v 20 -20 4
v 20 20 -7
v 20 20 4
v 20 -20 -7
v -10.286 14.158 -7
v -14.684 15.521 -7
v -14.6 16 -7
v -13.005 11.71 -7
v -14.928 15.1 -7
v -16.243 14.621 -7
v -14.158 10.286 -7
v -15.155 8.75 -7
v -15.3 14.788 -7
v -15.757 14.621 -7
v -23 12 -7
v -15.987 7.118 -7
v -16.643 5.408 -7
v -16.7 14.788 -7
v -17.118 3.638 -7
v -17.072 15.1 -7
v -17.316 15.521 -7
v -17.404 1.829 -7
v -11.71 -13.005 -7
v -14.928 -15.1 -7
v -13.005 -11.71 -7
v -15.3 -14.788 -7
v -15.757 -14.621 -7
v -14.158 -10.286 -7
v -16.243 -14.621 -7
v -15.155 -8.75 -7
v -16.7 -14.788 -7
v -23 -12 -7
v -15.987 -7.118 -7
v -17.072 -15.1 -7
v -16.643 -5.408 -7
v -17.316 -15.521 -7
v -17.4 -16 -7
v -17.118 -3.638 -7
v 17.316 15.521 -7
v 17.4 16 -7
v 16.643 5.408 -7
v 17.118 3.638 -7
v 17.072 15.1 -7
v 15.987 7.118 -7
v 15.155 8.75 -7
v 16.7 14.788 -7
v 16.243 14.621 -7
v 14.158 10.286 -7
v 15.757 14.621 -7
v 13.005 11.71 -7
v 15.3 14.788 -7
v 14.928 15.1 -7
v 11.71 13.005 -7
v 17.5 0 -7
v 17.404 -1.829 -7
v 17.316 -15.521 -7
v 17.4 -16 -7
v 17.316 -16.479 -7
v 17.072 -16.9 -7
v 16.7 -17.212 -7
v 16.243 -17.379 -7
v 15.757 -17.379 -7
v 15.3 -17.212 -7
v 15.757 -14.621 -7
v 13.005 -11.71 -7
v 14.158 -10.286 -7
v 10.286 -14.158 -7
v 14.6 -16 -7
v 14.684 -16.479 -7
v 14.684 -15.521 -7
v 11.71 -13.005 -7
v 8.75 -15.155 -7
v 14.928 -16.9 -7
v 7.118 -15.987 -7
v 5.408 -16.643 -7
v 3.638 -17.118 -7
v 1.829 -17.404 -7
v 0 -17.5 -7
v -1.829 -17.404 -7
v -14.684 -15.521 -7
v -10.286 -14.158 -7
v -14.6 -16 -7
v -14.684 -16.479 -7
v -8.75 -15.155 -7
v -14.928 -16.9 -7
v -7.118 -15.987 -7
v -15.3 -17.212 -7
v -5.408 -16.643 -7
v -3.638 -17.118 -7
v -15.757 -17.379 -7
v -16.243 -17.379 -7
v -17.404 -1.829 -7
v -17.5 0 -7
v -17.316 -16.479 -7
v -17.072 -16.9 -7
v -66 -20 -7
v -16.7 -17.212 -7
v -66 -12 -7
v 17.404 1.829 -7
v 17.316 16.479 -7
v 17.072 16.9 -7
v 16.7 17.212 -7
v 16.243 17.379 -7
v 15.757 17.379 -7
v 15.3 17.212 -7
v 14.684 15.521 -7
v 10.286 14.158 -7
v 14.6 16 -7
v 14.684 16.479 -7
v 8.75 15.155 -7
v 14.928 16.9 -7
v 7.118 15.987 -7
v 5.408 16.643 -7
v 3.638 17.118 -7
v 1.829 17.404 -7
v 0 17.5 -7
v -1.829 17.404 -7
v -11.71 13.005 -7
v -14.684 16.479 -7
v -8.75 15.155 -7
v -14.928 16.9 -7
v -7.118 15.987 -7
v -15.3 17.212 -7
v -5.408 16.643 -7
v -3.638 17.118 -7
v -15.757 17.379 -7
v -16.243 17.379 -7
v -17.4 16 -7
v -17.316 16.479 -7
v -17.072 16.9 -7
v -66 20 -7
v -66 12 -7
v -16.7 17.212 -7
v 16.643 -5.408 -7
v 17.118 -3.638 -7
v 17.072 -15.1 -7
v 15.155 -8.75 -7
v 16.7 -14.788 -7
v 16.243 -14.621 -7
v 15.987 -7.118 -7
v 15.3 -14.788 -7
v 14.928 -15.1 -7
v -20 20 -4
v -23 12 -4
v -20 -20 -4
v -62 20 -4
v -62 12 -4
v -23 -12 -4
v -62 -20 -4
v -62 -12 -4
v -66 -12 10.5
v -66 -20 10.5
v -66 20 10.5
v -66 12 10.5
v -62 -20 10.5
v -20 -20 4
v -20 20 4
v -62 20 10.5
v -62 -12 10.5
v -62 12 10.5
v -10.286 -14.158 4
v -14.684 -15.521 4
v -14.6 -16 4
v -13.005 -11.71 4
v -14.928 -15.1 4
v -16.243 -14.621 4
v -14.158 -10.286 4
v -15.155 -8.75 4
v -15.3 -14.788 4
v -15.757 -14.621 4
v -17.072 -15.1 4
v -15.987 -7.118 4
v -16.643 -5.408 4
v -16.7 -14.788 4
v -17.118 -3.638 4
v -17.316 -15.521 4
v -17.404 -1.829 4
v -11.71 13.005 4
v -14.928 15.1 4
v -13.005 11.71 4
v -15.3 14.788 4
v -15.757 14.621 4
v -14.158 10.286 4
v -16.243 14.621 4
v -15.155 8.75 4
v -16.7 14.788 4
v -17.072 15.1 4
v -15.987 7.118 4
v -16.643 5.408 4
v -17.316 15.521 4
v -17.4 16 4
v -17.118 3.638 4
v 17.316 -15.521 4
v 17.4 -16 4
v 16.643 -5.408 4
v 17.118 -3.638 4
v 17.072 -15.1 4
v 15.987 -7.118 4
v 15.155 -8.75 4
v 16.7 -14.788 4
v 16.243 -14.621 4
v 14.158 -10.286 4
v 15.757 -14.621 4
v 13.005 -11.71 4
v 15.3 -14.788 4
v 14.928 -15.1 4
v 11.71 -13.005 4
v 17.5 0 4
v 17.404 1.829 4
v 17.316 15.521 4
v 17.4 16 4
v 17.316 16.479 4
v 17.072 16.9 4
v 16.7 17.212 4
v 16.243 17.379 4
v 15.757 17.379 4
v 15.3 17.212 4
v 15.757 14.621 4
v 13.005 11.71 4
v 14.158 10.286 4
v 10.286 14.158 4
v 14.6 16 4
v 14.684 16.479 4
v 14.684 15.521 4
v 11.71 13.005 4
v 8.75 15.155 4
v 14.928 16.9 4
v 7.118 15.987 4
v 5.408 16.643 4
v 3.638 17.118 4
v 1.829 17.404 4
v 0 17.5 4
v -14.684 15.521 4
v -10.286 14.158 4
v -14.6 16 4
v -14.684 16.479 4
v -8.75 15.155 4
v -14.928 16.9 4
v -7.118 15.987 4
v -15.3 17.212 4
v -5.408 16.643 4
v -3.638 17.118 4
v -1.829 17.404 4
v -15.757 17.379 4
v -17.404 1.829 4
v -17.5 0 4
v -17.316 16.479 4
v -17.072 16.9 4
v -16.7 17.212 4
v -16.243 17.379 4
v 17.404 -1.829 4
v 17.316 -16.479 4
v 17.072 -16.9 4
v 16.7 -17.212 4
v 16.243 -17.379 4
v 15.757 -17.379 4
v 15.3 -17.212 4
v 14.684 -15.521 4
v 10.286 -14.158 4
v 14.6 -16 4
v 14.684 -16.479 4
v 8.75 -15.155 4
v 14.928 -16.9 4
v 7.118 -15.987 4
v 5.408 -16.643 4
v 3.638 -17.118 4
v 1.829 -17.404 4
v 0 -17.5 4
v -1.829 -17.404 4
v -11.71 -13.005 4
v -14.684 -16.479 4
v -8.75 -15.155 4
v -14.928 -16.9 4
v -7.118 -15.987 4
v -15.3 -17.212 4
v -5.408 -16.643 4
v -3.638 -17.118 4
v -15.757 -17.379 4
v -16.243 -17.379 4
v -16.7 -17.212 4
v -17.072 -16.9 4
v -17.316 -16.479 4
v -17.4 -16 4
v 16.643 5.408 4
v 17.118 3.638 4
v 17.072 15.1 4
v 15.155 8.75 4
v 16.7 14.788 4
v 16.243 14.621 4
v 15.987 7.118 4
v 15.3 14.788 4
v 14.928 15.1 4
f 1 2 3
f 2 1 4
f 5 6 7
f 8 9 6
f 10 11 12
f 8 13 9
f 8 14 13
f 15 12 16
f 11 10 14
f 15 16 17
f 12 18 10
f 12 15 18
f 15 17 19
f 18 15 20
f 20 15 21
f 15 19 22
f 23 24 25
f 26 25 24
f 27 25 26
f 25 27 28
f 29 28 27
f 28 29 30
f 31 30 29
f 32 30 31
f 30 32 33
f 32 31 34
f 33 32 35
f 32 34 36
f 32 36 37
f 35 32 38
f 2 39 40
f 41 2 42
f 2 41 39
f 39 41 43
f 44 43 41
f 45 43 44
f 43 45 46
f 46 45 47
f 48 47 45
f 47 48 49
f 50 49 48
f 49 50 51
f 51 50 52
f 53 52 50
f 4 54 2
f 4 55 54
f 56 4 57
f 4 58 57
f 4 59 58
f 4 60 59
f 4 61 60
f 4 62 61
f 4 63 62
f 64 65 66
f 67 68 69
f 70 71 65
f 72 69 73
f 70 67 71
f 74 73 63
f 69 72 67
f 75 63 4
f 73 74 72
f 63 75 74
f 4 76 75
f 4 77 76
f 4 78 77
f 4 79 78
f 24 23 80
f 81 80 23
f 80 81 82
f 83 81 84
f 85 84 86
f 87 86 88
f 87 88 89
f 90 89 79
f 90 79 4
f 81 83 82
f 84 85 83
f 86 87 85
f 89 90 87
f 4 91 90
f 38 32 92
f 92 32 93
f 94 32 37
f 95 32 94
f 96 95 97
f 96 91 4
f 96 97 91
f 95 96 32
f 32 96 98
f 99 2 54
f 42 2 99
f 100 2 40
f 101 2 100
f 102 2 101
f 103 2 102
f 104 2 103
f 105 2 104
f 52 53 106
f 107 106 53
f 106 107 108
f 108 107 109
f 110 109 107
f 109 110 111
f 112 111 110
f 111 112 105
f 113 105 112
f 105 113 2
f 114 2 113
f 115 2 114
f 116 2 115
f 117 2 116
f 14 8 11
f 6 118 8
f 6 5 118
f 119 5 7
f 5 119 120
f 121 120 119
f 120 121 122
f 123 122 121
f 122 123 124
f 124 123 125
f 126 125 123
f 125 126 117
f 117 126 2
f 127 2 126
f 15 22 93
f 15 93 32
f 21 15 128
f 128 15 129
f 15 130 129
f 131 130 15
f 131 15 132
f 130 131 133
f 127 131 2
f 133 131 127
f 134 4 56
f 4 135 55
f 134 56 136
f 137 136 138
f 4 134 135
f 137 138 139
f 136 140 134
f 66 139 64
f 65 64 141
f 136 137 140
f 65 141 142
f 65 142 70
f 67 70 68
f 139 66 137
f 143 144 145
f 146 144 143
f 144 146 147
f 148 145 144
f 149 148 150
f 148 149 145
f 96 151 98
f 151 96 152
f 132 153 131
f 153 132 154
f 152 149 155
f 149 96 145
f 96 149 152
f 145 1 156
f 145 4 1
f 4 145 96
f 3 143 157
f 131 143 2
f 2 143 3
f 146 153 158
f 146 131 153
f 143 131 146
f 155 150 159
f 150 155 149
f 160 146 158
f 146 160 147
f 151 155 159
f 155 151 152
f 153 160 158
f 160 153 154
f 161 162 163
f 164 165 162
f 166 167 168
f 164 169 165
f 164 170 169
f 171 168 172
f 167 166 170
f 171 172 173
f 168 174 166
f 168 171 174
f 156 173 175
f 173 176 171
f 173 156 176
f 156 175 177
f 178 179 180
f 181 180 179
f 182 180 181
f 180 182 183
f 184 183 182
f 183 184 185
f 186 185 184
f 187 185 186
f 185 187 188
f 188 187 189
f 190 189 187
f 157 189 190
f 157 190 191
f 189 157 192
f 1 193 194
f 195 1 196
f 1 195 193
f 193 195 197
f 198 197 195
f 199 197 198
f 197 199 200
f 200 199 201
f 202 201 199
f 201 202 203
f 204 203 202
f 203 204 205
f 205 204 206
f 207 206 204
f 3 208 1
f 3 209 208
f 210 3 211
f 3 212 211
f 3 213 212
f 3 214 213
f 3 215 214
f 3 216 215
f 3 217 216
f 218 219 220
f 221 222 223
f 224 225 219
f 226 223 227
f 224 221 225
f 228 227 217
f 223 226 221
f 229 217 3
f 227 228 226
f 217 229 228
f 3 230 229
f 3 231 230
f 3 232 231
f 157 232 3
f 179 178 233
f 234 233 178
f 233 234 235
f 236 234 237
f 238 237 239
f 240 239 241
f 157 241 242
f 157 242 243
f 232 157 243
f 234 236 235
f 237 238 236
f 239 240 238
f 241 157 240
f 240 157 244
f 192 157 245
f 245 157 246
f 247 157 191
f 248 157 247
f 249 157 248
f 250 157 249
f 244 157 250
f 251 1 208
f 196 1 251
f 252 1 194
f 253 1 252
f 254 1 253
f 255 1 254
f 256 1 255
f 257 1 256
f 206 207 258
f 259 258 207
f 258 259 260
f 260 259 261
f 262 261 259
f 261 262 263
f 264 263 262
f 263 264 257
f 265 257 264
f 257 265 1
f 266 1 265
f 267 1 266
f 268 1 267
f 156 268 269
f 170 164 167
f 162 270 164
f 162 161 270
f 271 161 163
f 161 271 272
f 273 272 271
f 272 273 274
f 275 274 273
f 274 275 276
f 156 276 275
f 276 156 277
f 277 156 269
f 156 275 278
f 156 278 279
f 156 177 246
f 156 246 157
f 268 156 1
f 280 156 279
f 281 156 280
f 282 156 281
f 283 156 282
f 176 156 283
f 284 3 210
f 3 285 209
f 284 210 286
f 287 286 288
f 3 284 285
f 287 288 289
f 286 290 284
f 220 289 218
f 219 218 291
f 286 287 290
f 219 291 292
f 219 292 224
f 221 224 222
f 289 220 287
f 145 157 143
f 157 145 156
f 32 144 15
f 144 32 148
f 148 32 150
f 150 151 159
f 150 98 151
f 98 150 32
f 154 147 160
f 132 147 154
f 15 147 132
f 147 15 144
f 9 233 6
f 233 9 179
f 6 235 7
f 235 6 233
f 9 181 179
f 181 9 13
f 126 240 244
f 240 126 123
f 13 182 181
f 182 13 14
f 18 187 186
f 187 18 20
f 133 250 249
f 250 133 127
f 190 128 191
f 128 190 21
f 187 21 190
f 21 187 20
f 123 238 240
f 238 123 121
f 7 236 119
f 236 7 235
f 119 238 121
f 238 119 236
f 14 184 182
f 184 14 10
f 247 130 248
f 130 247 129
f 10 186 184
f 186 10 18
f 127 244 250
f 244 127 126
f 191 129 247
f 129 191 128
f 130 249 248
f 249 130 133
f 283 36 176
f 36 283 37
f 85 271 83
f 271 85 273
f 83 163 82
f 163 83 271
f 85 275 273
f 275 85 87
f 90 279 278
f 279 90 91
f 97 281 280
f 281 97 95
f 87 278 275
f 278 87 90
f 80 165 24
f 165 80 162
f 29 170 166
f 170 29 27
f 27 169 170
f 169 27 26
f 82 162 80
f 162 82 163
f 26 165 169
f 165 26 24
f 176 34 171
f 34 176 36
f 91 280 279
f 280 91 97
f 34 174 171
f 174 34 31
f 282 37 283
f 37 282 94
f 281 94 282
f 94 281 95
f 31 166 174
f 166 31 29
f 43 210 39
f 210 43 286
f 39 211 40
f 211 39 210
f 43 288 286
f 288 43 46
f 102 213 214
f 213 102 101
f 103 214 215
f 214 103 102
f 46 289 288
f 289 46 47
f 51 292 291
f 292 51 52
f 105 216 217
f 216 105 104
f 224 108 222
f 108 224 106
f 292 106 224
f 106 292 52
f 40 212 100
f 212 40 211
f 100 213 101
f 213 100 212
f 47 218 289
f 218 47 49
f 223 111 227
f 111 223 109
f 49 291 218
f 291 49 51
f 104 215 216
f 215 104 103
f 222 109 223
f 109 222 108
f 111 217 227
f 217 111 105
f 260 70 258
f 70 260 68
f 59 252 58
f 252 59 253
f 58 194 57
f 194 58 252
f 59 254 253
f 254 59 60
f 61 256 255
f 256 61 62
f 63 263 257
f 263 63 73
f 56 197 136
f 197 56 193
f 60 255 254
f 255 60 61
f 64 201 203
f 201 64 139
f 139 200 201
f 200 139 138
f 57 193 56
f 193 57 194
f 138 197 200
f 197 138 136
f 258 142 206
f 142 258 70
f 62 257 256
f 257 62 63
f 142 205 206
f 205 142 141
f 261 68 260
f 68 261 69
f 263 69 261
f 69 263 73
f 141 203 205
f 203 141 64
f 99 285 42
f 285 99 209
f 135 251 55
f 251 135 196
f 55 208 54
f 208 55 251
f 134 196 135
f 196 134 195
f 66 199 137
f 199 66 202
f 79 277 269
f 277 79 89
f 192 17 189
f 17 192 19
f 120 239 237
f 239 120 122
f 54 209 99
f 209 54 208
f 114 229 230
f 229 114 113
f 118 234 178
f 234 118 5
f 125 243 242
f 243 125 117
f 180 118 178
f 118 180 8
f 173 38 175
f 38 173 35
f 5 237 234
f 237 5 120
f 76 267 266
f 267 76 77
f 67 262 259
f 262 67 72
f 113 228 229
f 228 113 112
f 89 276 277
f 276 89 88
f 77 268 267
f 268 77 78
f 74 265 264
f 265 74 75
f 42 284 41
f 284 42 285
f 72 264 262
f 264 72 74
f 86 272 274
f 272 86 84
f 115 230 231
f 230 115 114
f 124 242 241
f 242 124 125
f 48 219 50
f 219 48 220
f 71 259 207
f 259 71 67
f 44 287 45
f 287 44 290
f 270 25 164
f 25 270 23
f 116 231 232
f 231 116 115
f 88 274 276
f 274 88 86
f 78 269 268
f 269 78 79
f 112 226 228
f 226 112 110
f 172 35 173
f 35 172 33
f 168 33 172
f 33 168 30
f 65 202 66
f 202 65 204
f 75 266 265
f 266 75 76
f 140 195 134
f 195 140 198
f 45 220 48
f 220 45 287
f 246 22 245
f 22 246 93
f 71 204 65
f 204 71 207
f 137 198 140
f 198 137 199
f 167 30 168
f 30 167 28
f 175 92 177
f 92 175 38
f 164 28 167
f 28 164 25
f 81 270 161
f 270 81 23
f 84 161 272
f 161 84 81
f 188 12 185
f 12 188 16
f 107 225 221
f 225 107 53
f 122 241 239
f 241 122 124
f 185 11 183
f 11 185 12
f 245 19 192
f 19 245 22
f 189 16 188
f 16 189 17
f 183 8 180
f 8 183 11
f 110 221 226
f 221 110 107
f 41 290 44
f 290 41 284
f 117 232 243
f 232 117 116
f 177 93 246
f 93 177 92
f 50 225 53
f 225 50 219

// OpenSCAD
// file: rubik_cube.scad
$fa=6;
$fs=0.5;

size = 18.7;
offset = (size-0.1-4)/2;

module center(){
    hull(){
        translate([offset,offset,0]) cylinder(0.2, d=4, center=true);
        translate([offset,-offset,0]) cylinder(0.2, d=4, center=true);
        translate([-offset,offset,0]) cylinder(0.2, d=4, center=true);
        translate([-offset,-offset,0]) cylinder(0.2, d=4, center=true);
    }
}

module edge(){
    hull(){
        translate([offset,offset,0]) cube([4,4,0.2], center=true);
        translate([offset,-offset,0]) cube([4,4,0.2], center=true);
        translate([-offset,offset,0]) cylinder(0.2, d=4, center=true);
        translate([-offset,-offset,0]) cylinder(0.2, d=4, center=true);
    }
}

module corner(){
    hull(){
        translate([offset,offset,0]) cube([4,4,0.2], center=true);
        translate([offset,-offset,0]) cube([4,4,0.2], center=true);
        translate([-offset,offset,0]) cube([4,4,0.2], center=true);
        translate([-offset,-offset,0]) cylinder(0.2, d=4, center=true);
    }
}

module face(){
    center();
    for(i=[0,90,180,270]){
        rotate([0,0,i]) translate([size, 0, 0]) edge();
        rotate([0,0,i]) translate([size, size, 0]) corner();
    }
}

module rubik_cube(){
    color("white") cube(56,center=true);
    translate([0,0,3*size/2]) color("yellow") face();
    translate([0,0,-3*size/2]) color("white") face();
    rotate([90,0,0]){
        translate([0,0,3*size/2]) color("blue") face();
        translate([0,0,-3*size/2]) color("green") face();
    }
    rotate([0,90,0]){
        translate([0,0,3*size/2]) color("red") face();
        translate([0,0,-3*size/2]) color("orange") face();
    }
}
rubik_cube();
// file: stepper.scad
$fa=6;
$fs=0.5;



stepper42();
translate([0,0,23]) rotate([180,0,0]) flange();
module flange(){
    difference(){
        union(){
            cylinder(h=2,d=22);
            cylinder(h=12,d=10);
        }
        cylinder(h=99,d=5,center=true);
        translate([8,0,0]) cylinder(h=99,d=3,center=true);
        translate([-8,0,0]) cylinder(h=99,d=3,center=true);
        translate([0,-8,0]) cylinder(h=99,d=3,center=true);
        translate([0,8,0]) cylinder(h=99,d=3,center=true);
    }
}


module stepper42(){
    union(){
        top();
        translate([0,0,-8]) mid();
        translate([0,0,-8-9.5-23-8]) mirror([0,0,1]) bot();
    }
}


module mid(){
    mid_r = 8;
    offset_xy = 42/2 - mid_r;
    length = 23+8; // 硅钢片高度
    hull(){
        translate([offset_xy, offset_xy, -length]) cylinder(h=length, r=mid_r, $fn=4);
        translate([offset_xy, -offset_xy, -length]) cylinder(h=length, r=mid_r, $fn=4);
        translate([-offset_xy, offset_xy, -length]) cylinder(h=length, r=mid_r, $fn=4);
        translate([-offset_xy, -offset_xy, -length]) cylinder(h=length, r=mid_r, $fn=4);
    }
}
module top(){
    top_r = 4;
    offset_xy = 42/2 - top_r;
    length = 23+2; // 电机轴长度
    union(){
        difference(){
            hull(){
                translate([offset_xy, offset_xy, -8]) cylinder(h=8, r=top_r, $fn=4);
                translate([offset_xy, -offset_xy, -8]) cylinder(h=8, r=top_r, $fn=4);
                translate([-offset_xy, offset_xy, -8]) cylinder(h=8, r=top_r, $fn=4);
                translate([-offset_xy, -offset_xy, -8]) cylinder(h=8, r=top_r, $fn=4);
            }
            translate([31/2, 31/2, 0]) cylinder(h=20,d=2.5,center=true); 
            translate([-31/2, 31/2, 0]) cylinder(h=20,d=2.5,center=true);
            translate([31/2, -31/2, 0]) cylinder(h=20,d=2.5,center=true);
            translate([-31/2, -31/2, 0]) cylinder(h=20,d=2.5,center=true);       
        }
        difference(){
            cylinder(h=2,d=22);
            cylinder(h=20,d=9,center=true);
        }
        difference(){
             cylinder(h=length,d=5);
             translate([-5/2, 4.5/2, 0]) cube([5,5,length]);
        }
    }
}
module bot()
{
    bot_r = 4;
    offset_xy = 42/2 - bot_r;
    union(){
        difference(){
            hull(){
                translate([offset_xy, offset_xy, -9.5]) cylinder(h=9.5, r=bot_r, $fn=4);
                translate([offset_xy, -offset_xy, -9.5]) cylinder(h=9.5, r=bot_r, $fn=4);
                translate([-offset_xy, offset_xy, -9.5]) cylinder(h=9.5, r=bot_r, $fn=4);
                translate([-offset_xy, -offset_xy, -9.5]) cylinder(h=9.5, r=bot_r, $fn=4);
            }
            translate([31/2, 31/2, 0]) cylinder(h=20,d=3.5,center=true); 
            translate([-31/2, 31/2, 0]) cylinder(h=20,d=3.5,center=true);
            translate([31/2, -31/2, 0]) cylinder(h=20,d=3.5,center=true);
            translate([-31/2, -31/2, 0]) cylinder(h=20,d=3.5,center=true);
            translate([31/2, 31/2, -2.5]) cylinder(h=20,d=6); 
            translate([-31/2, 31/2, -2.5]) cylinder(h=20,d=6);
            translate([31/2, -31/2, -2.5]) cylinder(h=20,d=6);
            translate([-31/2, -31/2, -2.5]) cylinder(h=20,d=6);
            translate([0, 0, -3.5]) cylinder(h=20,d=9);
        }
        translate([-16/2,42/2,-9.5])cube([16,6,9.5]);
    }
}
// main file
$fa=6;
$fs=0.5;
use <main.scad>



// 以下分别打印1个
//base_board();
//cube_spin();
rotate([180,0,0]) fan_holder();

// 以下分别打印2个
//claw_3d_print();
//stepper_shelf();

// 以下分别打印4个
//spring();


// 垫柱，打印不同尺寸的备用
/*
for(i=[0:7]){
    translate([10*0,i*10,0])cyl(2);
    translate([10*1,i*10,0])cyl(3);
    translate([10*2,i*10,0])cyl(4);
    translate([10*3,i*10,0])cyl(5);
}
*/
